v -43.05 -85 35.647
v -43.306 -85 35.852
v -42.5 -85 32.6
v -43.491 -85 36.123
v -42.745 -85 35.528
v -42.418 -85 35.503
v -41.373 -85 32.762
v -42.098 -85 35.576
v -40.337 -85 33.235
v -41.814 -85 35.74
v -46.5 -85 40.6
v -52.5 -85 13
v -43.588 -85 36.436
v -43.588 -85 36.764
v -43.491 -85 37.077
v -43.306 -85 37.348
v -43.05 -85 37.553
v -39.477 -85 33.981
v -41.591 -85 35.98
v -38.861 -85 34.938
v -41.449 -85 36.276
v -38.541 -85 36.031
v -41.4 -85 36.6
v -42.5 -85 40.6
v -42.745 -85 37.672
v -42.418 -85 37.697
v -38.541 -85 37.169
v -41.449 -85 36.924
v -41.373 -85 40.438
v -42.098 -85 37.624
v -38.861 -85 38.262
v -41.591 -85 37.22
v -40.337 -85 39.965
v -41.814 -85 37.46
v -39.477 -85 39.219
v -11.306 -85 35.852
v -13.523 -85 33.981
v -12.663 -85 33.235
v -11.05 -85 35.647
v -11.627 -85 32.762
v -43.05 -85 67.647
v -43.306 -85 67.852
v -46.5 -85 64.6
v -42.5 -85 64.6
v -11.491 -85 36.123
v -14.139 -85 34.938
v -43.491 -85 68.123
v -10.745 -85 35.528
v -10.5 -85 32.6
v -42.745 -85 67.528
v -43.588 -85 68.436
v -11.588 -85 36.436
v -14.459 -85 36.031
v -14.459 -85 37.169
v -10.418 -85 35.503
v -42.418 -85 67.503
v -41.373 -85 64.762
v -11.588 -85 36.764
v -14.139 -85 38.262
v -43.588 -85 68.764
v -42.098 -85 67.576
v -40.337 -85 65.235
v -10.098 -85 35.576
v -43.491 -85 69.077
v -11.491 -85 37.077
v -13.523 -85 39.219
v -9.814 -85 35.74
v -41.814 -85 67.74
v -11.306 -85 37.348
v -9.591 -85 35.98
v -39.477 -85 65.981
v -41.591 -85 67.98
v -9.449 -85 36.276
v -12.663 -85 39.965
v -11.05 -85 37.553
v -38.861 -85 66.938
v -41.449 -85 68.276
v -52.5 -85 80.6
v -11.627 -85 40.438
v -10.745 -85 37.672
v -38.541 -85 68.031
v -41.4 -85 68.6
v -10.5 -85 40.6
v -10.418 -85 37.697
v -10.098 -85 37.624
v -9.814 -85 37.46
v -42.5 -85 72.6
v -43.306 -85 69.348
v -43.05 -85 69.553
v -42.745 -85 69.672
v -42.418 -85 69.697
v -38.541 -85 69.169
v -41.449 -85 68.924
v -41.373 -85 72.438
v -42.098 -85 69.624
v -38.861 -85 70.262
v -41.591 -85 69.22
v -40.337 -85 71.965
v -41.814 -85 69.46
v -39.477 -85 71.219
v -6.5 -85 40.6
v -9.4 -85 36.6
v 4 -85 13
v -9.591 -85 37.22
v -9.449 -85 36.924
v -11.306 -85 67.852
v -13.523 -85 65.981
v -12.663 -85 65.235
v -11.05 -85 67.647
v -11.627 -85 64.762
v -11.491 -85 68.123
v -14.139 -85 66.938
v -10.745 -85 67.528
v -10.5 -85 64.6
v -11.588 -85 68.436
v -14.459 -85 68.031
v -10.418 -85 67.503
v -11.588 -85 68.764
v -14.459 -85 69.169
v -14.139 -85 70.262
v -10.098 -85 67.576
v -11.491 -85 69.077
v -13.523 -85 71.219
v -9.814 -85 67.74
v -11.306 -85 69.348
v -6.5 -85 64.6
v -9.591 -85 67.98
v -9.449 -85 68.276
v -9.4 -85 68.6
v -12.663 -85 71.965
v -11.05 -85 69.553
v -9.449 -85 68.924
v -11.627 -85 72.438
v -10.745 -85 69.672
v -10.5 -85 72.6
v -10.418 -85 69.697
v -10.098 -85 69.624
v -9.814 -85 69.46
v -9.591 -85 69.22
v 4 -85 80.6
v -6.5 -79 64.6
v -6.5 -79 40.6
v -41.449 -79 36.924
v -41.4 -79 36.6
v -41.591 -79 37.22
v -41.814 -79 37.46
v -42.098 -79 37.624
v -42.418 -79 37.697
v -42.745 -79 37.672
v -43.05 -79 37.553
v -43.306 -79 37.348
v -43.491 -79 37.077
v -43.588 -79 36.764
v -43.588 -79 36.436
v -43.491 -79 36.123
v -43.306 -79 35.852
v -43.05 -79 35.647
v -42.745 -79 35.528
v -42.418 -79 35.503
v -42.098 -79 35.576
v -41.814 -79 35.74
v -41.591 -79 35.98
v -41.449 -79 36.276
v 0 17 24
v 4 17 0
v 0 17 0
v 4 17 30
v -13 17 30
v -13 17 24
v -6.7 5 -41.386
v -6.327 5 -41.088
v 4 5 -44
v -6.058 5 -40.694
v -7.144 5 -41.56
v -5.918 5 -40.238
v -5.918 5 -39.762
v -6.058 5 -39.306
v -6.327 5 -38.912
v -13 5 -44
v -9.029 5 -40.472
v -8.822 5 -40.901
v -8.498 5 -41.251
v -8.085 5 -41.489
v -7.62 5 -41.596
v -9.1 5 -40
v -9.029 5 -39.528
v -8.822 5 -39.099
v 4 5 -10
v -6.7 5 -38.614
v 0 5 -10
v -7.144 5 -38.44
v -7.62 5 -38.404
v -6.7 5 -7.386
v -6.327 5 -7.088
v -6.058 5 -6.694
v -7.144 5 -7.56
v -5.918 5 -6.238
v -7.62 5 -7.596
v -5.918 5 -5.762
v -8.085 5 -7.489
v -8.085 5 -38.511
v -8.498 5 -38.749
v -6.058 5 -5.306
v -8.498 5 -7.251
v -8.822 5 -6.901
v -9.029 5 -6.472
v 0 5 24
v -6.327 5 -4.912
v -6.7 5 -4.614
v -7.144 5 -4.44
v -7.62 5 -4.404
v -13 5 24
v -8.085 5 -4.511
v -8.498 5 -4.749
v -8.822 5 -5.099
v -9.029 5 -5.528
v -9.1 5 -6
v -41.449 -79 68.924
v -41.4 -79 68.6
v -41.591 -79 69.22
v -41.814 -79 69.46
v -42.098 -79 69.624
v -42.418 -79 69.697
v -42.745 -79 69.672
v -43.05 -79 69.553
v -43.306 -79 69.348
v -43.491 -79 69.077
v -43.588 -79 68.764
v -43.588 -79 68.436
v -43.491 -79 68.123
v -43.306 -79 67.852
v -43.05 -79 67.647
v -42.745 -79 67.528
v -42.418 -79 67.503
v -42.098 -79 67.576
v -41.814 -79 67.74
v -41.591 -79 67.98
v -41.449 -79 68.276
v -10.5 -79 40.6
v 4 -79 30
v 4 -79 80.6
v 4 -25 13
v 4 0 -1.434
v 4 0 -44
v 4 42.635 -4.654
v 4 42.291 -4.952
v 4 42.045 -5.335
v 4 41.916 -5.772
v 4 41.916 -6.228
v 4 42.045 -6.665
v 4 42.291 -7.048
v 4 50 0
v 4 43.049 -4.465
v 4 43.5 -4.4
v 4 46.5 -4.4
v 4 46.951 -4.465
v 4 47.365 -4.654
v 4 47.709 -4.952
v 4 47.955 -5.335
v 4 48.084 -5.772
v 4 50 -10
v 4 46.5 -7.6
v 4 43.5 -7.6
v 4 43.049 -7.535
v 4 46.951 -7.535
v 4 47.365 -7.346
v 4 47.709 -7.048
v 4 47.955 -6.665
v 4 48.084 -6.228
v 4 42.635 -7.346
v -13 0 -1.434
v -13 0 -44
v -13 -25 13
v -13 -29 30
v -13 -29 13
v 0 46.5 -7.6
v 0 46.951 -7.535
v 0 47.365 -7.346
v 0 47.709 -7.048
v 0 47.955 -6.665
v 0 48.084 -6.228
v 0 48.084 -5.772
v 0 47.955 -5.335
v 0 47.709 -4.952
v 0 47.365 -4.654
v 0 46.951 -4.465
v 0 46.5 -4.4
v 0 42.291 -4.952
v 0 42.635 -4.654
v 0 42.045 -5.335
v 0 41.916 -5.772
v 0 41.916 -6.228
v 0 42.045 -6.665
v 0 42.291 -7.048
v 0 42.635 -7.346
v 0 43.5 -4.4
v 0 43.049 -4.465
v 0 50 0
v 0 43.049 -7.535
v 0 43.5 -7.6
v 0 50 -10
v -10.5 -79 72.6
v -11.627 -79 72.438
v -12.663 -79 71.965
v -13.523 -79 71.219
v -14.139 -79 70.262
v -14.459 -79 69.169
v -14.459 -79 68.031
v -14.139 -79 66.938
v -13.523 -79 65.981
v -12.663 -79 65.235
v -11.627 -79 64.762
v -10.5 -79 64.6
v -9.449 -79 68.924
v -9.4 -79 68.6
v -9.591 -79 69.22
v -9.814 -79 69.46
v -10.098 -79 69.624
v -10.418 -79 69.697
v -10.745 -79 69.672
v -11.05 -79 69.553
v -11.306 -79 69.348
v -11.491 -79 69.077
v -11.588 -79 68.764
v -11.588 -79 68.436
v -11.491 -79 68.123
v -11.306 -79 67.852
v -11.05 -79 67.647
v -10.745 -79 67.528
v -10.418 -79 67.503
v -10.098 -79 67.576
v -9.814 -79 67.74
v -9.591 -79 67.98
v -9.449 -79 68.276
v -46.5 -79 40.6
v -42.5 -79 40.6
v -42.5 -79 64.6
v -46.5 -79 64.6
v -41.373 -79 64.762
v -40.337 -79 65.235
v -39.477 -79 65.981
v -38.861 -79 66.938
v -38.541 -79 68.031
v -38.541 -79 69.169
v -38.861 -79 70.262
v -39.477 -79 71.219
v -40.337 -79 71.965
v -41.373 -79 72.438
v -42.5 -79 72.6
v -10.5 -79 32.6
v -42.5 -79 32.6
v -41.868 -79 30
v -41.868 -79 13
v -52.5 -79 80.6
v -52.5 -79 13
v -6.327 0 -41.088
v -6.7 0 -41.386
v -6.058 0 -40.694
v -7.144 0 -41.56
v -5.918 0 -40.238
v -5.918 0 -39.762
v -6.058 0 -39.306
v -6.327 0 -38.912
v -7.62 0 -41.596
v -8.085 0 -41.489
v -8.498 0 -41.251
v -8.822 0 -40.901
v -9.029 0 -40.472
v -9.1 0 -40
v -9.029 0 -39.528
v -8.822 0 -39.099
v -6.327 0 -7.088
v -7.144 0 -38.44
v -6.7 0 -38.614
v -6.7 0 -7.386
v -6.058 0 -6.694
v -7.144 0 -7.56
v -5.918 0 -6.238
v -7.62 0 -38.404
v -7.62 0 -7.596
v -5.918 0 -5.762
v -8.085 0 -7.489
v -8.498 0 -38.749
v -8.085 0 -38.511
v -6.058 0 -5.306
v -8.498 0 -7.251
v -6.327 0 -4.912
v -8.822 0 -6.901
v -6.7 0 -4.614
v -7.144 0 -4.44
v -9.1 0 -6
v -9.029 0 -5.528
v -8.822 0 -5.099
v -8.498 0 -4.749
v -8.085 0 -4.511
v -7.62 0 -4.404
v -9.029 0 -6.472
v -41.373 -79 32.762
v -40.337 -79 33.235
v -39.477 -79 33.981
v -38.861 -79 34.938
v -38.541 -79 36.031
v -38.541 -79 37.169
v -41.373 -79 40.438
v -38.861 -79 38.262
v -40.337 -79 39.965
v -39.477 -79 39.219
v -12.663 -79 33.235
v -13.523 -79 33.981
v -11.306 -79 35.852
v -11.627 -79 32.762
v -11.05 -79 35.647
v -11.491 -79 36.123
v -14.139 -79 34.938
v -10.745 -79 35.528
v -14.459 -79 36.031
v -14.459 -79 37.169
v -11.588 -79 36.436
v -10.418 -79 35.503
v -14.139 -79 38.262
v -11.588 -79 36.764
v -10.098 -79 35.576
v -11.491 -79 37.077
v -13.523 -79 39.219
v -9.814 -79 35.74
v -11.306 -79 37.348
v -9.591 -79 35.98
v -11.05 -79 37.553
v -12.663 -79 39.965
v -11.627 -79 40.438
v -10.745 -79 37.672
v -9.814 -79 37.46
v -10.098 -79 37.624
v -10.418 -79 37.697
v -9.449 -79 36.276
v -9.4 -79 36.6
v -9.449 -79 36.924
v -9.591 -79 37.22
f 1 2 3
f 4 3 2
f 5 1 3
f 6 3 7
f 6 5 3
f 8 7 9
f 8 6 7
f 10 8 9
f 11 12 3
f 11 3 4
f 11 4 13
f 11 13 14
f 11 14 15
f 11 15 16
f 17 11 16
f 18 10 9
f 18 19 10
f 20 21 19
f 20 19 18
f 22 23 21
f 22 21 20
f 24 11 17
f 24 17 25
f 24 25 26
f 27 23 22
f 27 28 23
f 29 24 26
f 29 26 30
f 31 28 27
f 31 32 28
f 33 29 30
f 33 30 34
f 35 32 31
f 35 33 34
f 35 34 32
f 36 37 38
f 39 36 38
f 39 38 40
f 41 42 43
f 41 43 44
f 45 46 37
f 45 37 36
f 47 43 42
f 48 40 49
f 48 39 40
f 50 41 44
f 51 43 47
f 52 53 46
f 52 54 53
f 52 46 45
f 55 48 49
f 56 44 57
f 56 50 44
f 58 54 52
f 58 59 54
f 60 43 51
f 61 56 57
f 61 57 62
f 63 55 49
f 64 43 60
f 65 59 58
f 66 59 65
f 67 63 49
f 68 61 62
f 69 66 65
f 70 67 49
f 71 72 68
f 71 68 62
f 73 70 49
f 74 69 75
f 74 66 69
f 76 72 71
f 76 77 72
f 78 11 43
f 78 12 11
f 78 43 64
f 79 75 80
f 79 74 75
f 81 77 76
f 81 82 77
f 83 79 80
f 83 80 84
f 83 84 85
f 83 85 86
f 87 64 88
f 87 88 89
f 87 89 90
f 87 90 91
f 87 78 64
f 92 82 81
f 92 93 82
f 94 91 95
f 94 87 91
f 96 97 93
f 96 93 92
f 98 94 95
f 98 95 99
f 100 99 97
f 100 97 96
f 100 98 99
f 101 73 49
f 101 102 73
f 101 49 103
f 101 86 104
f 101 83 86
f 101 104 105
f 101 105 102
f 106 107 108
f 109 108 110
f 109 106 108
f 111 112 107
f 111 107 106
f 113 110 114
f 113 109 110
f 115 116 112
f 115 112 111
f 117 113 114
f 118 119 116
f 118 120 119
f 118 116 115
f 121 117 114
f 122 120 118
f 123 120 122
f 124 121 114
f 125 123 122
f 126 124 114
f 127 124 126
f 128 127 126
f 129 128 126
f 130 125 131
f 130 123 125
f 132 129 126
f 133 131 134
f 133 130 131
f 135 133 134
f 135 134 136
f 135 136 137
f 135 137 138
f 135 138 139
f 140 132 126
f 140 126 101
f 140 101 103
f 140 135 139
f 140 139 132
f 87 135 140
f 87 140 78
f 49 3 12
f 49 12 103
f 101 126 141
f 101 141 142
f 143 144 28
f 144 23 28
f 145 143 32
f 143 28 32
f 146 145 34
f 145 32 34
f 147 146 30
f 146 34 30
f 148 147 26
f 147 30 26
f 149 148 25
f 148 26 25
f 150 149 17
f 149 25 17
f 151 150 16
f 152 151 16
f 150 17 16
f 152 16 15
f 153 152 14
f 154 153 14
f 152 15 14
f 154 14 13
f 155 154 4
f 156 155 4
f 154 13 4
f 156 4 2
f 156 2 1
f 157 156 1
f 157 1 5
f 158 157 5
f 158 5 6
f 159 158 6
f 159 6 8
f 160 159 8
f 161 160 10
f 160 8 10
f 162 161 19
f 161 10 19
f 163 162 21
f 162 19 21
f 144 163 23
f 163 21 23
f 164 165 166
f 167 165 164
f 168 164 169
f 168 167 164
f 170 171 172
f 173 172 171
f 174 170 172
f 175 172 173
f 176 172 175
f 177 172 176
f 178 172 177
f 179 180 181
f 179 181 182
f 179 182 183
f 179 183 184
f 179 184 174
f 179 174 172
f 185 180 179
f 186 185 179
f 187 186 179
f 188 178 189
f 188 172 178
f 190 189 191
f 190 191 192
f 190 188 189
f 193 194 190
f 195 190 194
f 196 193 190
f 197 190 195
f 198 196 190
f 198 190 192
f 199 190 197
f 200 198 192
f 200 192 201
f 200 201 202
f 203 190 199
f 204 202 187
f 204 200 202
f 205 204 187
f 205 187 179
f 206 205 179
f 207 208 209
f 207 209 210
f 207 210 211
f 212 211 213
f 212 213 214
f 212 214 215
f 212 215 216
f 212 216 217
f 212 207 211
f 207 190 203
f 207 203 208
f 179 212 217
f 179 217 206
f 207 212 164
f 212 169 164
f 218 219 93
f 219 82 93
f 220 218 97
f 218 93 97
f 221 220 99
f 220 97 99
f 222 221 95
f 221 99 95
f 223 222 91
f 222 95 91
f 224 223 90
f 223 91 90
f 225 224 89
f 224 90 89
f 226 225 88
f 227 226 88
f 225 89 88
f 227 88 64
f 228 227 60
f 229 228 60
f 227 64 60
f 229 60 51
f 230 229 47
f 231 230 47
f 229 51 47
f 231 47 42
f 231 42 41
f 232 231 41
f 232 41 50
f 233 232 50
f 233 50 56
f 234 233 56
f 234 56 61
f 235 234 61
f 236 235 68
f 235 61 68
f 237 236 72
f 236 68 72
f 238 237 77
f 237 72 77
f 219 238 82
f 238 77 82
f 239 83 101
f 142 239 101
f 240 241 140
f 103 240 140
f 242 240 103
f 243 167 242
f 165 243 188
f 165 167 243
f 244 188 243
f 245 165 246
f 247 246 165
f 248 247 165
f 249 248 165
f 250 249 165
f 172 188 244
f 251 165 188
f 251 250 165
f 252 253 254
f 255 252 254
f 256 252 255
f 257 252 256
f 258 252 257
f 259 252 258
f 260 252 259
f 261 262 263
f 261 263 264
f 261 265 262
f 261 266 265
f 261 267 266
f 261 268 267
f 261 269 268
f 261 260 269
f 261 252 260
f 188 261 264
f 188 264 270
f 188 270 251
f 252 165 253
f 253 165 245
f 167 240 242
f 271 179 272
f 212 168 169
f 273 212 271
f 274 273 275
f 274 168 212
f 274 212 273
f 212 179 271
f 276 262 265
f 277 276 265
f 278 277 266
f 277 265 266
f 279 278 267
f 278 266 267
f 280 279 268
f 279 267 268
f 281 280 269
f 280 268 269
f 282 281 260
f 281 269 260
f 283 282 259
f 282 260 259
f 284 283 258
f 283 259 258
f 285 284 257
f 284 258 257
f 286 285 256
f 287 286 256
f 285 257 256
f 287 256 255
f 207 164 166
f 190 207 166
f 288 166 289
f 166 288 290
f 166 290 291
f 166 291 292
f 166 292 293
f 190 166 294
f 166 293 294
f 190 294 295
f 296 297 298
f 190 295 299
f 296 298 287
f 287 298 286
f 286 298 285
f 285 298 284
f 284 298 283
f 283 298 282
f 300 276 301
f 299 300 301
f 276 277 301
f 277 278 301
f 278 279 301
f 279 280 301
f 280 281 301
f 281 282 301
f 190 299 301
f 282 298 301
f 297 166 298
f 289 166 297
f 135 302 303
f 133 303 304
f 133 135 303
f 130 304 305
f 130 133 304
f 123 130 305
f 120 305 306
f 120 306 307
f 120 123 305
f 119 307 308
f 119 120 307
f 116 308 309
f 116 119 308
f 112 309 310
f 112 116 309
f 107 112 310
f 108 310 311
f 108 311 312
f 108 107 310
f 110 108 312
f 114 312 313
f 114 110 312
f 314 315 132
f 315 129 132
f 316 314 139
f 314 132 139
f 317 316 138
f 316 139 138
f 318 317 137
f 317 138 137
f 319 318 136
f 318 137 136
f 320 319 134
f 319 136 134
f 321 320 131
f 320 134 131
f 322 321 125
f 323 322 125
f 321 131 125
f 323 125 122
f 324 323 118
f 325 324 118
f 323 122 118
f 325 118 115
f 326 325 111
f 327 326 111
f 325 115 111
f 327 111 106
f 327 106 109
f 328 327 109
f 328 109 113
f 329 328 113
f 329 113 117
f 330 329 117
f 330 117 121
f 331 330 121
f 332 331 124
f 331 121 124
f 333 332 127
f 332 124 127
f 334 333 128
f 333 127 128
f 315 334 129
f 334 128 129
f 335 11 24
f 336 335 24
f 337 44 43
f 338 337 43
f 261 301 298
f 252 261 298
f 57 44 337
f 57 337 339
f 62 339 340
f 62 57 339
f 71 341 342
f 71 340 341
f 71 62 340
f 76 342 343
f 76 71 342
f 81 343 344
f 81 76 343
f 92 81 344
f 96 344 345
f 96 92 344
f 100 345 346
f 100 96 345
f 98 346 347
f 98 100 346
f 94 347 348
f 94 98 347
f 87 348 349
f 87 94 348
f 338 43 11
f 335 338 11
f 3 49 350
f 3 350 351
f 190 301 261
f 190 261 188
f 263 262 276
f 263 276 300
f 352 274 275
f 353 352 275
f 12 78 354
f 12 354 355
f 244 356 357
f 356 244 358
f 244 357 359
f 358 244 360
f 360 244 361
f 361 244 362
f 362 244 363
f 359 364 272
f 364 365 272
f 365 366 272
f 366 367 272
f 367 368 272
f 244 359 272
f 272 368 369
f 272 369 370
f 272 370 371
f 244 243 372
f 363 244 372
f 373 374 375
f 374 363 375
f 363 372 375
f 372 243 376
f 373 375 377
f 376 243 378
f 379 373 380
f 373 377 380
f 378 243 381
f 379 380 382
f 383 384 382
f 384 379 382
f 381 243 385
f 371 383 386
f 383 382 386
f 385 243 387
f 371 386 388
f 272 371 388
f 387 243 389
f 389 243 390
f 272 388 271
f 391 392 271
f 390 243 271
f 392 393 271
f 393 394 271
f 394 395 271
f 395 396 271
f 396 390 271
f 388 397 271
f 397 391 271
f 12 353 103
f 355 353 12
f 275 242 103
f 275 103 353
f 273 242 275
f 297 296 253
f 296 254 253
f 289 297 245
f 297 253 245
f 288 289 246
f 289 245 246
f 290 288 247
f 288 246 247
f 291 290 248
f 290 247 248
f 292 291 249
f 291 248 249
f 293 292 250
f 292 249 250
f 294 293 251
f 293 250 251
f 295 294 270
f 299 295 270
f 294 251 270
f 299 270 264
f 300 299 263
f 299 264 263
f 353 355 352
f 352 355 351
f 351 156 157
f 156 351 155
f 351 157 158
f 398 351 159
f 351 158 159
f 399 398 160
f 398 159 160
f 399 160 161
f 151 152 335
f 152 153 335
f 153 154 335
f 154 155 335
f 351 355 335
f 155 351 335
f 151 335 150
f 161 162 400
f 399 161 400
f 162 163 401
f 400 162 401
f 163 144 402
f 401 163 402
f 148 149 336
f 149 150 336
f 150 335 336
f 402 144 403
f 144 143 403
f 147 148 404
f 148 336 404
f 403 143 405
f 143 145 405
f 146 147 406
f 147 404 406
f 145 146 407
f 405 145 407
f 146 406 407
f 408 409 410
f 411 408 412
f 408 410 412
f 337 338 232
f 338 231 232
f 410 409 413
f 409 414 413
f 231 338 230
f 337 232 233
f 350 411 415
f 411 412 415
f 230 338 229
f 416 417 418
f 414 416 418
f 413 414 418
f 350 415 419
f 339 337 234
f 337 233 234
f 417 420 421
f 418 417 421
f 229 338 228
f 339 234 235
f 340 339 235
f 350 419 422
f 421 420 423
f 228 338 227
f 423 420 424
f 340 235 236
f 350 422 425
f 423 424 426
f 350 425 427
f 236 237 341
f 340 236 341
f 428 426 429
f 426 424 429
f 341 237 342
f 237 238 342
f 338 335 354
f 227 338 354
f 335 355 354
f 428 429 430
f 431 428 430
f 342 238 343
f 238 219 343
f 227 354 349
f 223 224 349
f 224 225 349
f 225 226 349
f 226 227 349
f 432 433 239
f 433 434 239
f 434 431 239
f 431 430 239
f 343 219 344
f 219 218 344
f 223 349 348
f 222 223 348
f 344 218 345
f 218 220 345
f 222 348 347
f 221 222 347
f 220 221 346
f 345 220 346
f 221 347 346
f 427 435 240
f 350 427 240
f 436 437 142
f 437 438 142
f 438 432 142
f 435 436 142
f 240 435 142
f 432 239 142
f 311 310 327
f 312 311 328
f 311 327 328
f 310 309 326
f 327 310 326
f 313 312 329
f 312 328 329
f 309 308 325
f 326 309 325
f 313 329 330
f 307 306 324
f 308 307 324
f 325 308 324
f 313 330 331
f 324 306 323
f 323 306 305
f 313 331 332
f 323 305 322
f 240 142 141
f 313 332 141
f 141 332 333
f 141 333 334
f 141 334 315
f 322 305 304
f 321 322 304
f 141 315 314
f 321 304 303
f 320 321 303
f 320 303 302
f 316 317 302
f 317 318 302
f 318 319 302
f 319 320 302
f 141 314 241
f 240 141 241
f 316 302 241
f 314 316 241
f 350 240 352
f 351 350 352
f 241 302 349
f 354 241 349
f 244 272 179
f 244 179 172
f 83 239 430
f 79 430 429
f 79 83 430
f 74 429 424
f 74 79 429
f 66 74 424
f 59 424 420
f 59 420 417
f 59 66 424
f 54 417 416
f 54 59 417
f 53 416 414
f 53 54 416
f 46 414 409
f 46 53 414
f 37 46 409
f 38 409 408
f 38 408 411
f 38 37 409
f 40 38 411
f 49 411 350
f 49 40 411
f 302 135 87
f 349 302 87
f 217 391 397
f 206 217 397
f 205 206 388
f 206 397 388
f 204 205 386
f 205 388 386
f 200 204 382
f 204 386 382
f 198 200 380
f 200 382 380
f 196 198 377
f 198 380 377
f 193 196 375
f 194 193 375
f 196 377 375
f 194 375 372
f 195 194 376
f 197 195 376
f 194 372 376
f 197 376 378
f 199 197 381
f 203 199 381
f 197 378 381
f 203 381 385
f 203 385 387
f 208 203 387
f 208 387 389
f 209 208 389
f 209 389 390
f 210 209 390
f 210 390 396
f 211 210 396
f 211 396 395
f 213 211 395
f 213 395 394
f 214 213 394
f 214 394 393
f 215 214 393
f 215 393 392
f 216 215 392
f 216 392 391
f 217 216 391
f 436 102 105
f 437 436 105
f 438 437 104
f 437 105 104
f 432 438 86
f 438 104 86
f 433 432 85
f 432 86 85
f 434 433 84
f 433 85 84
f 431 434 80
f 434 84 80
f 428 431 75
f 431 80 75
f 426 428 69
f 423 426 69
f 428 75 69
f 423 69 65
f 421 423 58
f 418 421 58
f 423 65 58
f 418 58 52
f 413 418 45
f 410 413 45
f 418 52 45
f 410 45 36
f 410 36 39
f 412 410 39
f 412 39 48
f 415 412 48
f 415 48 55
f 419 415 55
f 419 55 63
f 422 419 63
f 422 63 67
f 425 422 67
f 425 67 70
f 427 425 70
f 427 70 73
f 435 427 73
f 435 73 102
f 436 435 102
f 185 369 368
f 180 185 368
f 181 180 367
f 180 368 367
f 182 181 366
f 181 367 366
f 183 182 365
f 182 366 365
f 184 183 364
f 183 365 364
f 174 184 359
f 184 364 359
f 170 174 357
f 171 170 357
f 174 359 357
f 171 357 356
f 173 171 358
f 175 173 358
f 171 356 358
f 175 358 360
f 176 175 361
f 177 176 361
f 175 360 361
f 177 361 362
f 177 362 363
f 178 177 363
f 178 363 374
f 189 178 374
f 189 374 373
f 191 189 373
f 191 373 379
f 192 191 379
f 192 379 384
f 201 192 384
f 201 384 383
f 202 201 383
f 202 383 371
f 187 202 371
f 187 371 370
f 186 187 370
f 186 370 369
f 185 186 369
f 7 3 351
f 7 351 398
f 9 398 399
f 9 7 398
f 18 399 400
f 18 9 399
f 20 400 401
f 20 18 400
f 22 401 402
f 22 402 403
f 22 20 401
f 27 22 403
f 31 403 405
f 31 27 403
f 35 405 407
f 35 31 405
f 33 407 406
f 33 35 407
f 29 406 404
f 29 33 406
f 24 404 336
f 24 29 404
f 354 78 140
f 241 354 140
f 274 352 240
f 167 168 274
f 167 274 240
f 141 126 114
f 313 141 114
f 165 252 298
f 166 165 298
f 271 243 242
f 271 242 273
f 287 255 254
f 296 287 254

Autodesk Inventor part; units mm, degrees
ref_plane "YZ Plane" through (0, 0, 0) normal (1, 0, 0) x (0, 1, 0)
ref_plane "XZ Plane" through (0, 0, 0) normal (0, 1, 0) x (-1, 0, 0)
ref_plane "XY Plane" through (0, 0, 0) normal (0, 0, 1) x (1, 0, 0)
sketch "Sketch1" plane through (0, 0, 0) normal (0, 1, 0) x (-1, 0, 0)
  line L0 (0, 0) -> (13, 0)
  line L1 (13, 0) -> (13, -44)
  line L2 (13, -44) -> (0, -44)
  line L3 (0, -44) -> (0, 0)
  line L4 (13, 0) -> (13, -6)
  line L5 (13, -6) -> (7.5, -6)
  line L6 (7.5, -6) -> (7.5, -40)
  circle A0 centre (7.5, -6) radius 1.6
  circle A1 centre (7.5, -40) radius 1.6
  dimension "d0" = 13
  dimension "d1" = 44
  dimension "d2" = 6
  dimension "d3" = 5.5
  dimension "d4" = 34
  dimension "d5" = 3.2
  dimension "d6" = 3.2
extrude "Extrusion1" add sketch "Sketch1" along normal blind 5
sketch "Sketch2" plane through (0, 0, 0) normal (1, 0, 0) x (0, 0, -1)
  line L0 (0, 5) -> (44, 5) projected
  line L1 (0, 5) -> (44, 5)
  line L2 (44, 5) -> (44, 50)
  line L3 (44, 50) -> (0, 50)
  line L4 (0, 50) -> (0, 5)
  line L5 (0, 0) -> (44, 0)
  line L6 (44, 0) -> (44, 5)
  line L7 (44, 5) -> (0, 5)
  line L8 (0, 5) -> (0, 0)
  line L9 (0, 50) -> (10, 50)
  line L10 (10, 50) -> (10, 5)
  line L11 (10, 5) -> (0, 5)
  line L12 (0, 5) -> (0, 50)
  dimension "d9" = 44
  dimension "d10" = 45
  dimension "d11" = 10
extrude "Extrusion2" add sketch "Sketch2" along normal blind 4 contours L4 L3 L10 L0 | L0 L6 L5 L8
sketch "Sketch3" plane through (4, 0, 0) normal (1, 0, 0) x (0, 0, -1)
  line L0 (44, 5) -> (10, 5) projected
  line L1 (10, 5) -> (10, 45)
  line L2 (10, 5) -> (10, 50) projected
  line L3 (0, 50) -> (0, 5) projected
  line L4 (0, 45) -> (4.4, 45)
  line L5 (6, 45) -> (6, 46.5)
  line L6 (6, 45) -> (6, 43.5)
  line L7 (4.4, 46.5) -> (4.4, 43.5)
  line L8 (7.6, 46.5) -> (7.6, 43.5)
  arc A0 (5.4432, 45) -> (6, 44.9) centre (6, 46.5) ccw
  arc A1 (6.5568, 45) -> (4.4, 46.5) centre (6, 46.5) ccw
  line L9 (10, 45) -> (6.5568, 45)
  line L10 (5.4432, 45) -> (0, 45)
  arc A2 (6, 45.1) -> (5.4432, 45) centre (6, 43.5) ccw
  arc A3 (4.4, 43.5) -> (7.6, 43.5) centre (6, 43.5) ccw
  point P0 (0, 0)
  dimension "d14" = 40
  dimension "d15" = 6
  dimension "d16" = 1.5
  dimension "d17" = 1.5
extrude "Extrusion3" cut sketch "Sketch3" against normal blind 4 contours L6 A0 A2 L5 | A1 L9 L8 A3 L7 | L8 L9 A1
sketch "Sketch4" plane through (-13, 0, 0) normal (0, 0, 1) x (1, 0, 0)
  line L0 (0, 0) -> (17, 0) projected
  line L1 (17, 0) -> (17, 5) projected
  line L2 (0, 0) -> (17, 0)
  line L3 (17, 0) -> (17, 5)
  line L4 (17, 5) -> (0, 5)
  line L5 (0, 5) -> (0, 0)
  line L6 (13, 50) -> (13, 5) projected
  line L7 (17, 0) -> (13, 0)
  line L8 (13, 0) -> (13, 17)
  line L9 (13, 17) -> (17, 17)
  line L10 (17, 17) -> (17, 0)
  dimension "d22" = 17
extrude "Extrusion4" add sketch "Sketch4" along normal blind 30
sketch "Sketch5" plane through (0, 0, 0) normal (0, -1, 0) x (1, 0, 0)
  line L0 (-13, -44) -> (-13, 30) projected
  line L1 (-13, 30) -> (4, 30)
  line L2 (4, 30) -> (4, 13)
  line L3 (4, 13) -> (-13, 13)
  line L4 (-13, 13) -> (-13, 30)
  point P0 (0, 0)
  dimension "d25" = 17
  dimension "d26" = 17
extrude "Extrusion5" add sketch "Sketch5" along normal blind 85
sketch "Sketch7" plane through (0, -85, 0) normal (0, -1, 0) x (1, 0, 0)
  line L0 (4, 13) -> (-13, 13) projected
  line L1 (0, 30) -> (0, -10) projected
  line L2 (0, 13) -> (0, 30)
  line L3 (0, 30) -> (0, 52.6)
  circle A0 centre (-36, 52.6) radius 9
  line L4 (-36, 52.6) -> (-36, 36.6)
  line L5 (-36, 36.6) -> (-20, 36.6)
  line L6 (-36, 52.6) -> (-36, 68.6)
  line L7 (-36, 68.6) -> (-52, 68.6)
  line L8 (-52, 68.6) -> (-20, 68.6)
  line L9 (-20, 68.6) -> (-20, 36.6)
  line L10 (-20, 36.6) -> (-52, 36.6)
  line L11 (-52, 36.6) -> (-52, 68.6)
  circle A1 centre (-20, 68.6) radius 1.1
  circle A2 centre (-20, 36.6) radius 1.1
  circle A3 centre (-52, 36.6) radius 1.1
  circle A4 centre (-52, 68.6) radius 1.1
  circle A5 centre (-20, 68.6) radius 4
  circle A6 centre (-20, 36.6) radius 4
  line L12 (-52, 65.6) -> (-52, 70.6)
  line L13 (-52, 36.6) -> (-52, 42.6)
  circle A7 centre (-52, 68.6) radius 4
  circle A8 centre (-52, 36.6) radius 4
  point P0 (0, 0)
  point P1 (-20, 64.6)
  point P2 (-20, 40.6)
  dimension "d29" = 22.6
  dimension "d31" = 18
  dimension "d32" = 16
  dimension "d33" = 16
  dimension "d34" = 16
  dimension "d35" = 16
  dimension "d36" = 2.2
  dimension "d37" = 2.2
  dimension "d39" = 2.2
  dimension "d40" = 8
  dimension "d43" = 8
  dimension "d49" = 8
  dimension "d50" = 8
sketch "Sketch14" plane through (0, -85, 0) normal (0, -1, 0) x (1, 0, 0)
  line L0 (4, 13) -> (4, 30) projected
  line L1 (4, 13) -> (4, 52.6)
  line L2 (4, 52.6) -> (-26.5, 52.6)
  line L3 (-26.5, 52.6) -> (-26.5, 36.6)
  line L4 (-26.5, 36.6) -> (-10.5, 36.6)
  line L5 (-26.5, 52.6) -> (-42.5, 52.6)
  line L6 (-42.5, 52.6) -> (-42.5, 68.6)
  line L7 (-42.5, 68.6) -> (-10.5, 68.6)
  line L8 (-10.5, 68.6) -> (-10.5, 36.6)
  line L9 (-10.5, 36.6) -> (-42.5, 36.6)
  line L10 (-42.5, 36.6) -> (-42.5, 68.6)
  circle A0 centre (-42.5, 68.6) radius 1.1
  circle A1 centre (-10.5, 68.6) radius 1.1
  circle A2 centre (-10.5, 36.6) radius 1.1
  circle A3 centre (-42.5, 36.6) radius 1.1
  circle A4 centre (-42.5, 68.6) radius 4
  circle A5 centre (-10.5, 68.6) radius 4
  circle A6 centre (-10.5, 36.6) radius 4
  circle A7 centre (-42.5, 36.6) radius 4
  point P0 (0, 0)
  dimension "d91" = 39.6
  dimension "d92" = 30.5
  dimension "d93" = 16
  dimension "d94" = 16
  dimension "d95" = 16
  dimension "d96" = 16
  dimension "d97" = 2.2
  dimension "d98" = 2.2
  dimension "d99" = 2.2
  dimension "d100" = 2.2
  dimension "d101" = 8
  dimension "d102" = 8
  dimension "d103" = 8
  dimension "d104" = 8
extrude "Extrusion14" add sketch "Sketch14" against normal blind 6 contours A5 L7 A1 L8 | L8 A1 L7 A5 | A6 L4 A2 L8 | L8 A2 L4 A6 | A7 L10 A3 L9 | L9 A3 L10 A7 | A4 L7 A0 L6 | L6 A0 L7 A4
sketch "Sketch15" plane through (-10.5, -85, 68.6) normal (0, -1, 0) x (1, 0, 0)
  circle A0 centre (0, 0) radius 4 projected
  line L0 (0, 4) -> (10, 4)
  line L1 (10, 4) -> (10, -4)
  line L2 (10, -4) -> (0, -4)
  line L3 (0, -4) -> (0, 4)
  circle A1 centre (0, -32) radius 4 projected
  line L4 (0, -28) -> (10, -28)
  line L5 (10, -28) -> (10, -36)
  line L6 (10, -36) -> (0, -36)
  line L7 (0, -36) -> (0, -28)
  circle A2 centre (-32, -32) radius 4 projected
  line L8 (-32, -36) -> (-42, -36)
  line L9 (-42, -36) -> (-42, -28)
  line L10 (-42, -28) -> (-32, -28)
  line L11 (-32, -28) -> (-32, -36)
  circle A3 centre (-32, 0) radius 4 projected
  line L12 (-32, -4) -> (-42, -4)
  line L13 (-42, -4) -> (-42, 4)
  line L14 (-42, 4) -> (-32, 4)
  line L15 (-32, 4) -> (-32, -4)
  line L16 (-42, 4) -> (-36, 4)
  line L17 (-36, 4) -> (-36, -36)
  line L18 (-36, -36) -> (-42, -36)
  line L19 (-42, -36) -> (-42, 4)
  line L20 (10, 4) -> (4, 4)
  line L21 (4, 4) -> (4, -36)
  line L22 (4, -36) -> (10, -36)
  line L23 (10, -36) -> (10, 4)
  point P0 (10.5, -68.6)
  point P1 (-36, -4)
  point P2 (-32, 4)
  point P3 (-42, -4)
  point P4 (-36, -28)
  point P5 (0, -4)
  point P6 (4, -4)
  point P7 (4, -28)
  point P8 (10, -4)
  dimension "d107" = 10
  dimension "d108" = 8
  dimension "d109" = 10
  dimension "d110" = 8
  dimension "d111" = 10
  dimension "d112" = 8
  dimension "d113" = 10
  dimension "d114" = 8
  dimension "d115" = 6
  dimension "d116" = 6
extrude "Extrusion15" add sketch "Sketch15" against normal blind 6 contours L21 L2 A0 | A0 L0 L21 | L21 L0 L1 L2 | L2 L23 L4 L21 | L21 A1 L4 | L4 L5 L6 L21 | L21 L6 A1 | A2 L17 L10 | L8 L17 A2 | L17 L8 L9 L10 | L10 L19 L12 L17 | L17 A3 L12 | L12 L13 L14 L17 | L17 L14 A3
sketch "Sketch16" plane through (0, -85, 0) normal (0, -1, 0) x (1, 0, 0)
  line L0 (-0.5, 72.6) -> (-0.5, 32.6) projected
  line L1 (-0.5, 72.6) -> (-52.5, 72.6)
  line L2 (-52.5, 72.6) -> (-52.5, 80.6)
  line L3 (-52.5, 80.6) -> (-0.5, 80.6)
  line L4 (-0.5, 80.6) -> (-0.5, 72.6)
  line L5 (-0.5, 32.6) -> (-10.5, 32.6) projected
  line L6 (-0.5, 32.6) -> (-52.5, 32.6)
  line L7 (-52.5, 32.6) -> (-52.5, 24.6)
  line L8 (-52.5, 24.6) -> (-0.5, 24.6)
  line L9 (-0.5, 24.6) -> (-0.5, 32.6)
  point P0 (0, 0)
  dimension "d119" = 8
  dimension "d120" = 8
extrude "Extrusion16" add sketch "Sketch16" against normal blind 6
sketch "Sketch17" plane through (0, -79, 0) normal (0, 1, 0) x (1, 0, 0)
  line L0 (-0.5, -80.6) -> (-0.5, -30) projected
  line L1 (4, -30) -> (0, -30) projected
  line L2 (-0.5, -80.6) -> (4, -80.6)
  line L3 (4, -80.6) -> (4, -30)
  line L4 (4, -30) -> (-0.5, -30)
  line L5 (-0.5, -30) -> (-0.5, -80.6)
  line L6 (-52.5, -24.6) -> (-52.5, -80.6) projected
  line L7 (-52.5, -24.6) -> (-13, -24.6)
  line L8 (-13, -24.6) -> (-13, -13)
  line L9 (-13, -13) -> (-52.5, -13)
  line L10 (-52.5, -13) -> (-52.5, -24.6)
  point P0 (0, 0)
extrude "Extrusion17" add sketch "Sketch17" against normal blind 6
chamfer "Chamfer4" distance 50 angle 30 1 edges at (-13, -79, 21.5) measured on face at (-13, -24.6667, 24.3333)
chamfer "Chamfer5" distance 25 angle 30 1 edges at (-4.5, 0, 13) measured on face at (-16.9558, -64.3333, 13)
sketch "Sketch19" plane through (-13, 0, 30) normal (0, 0, 1) x (1, 0, 0)
  line L0 (13, 17) -> (13, 5) projected
  line L1 (0, 0) -> (0, 5) projected
  line L2 (13, 17) -> (0, 17)
  line L3 (0, 17) -> (0, 5)
  line L4 (0, 5) -> (13, 5)
  line L5 (13, 5) -> (13, 17)
  point P0 (13, 0)
extrude "Extrusion18" add sketch "Sketch19" against normal blind 6
properties part number "camera_mount_v1"
